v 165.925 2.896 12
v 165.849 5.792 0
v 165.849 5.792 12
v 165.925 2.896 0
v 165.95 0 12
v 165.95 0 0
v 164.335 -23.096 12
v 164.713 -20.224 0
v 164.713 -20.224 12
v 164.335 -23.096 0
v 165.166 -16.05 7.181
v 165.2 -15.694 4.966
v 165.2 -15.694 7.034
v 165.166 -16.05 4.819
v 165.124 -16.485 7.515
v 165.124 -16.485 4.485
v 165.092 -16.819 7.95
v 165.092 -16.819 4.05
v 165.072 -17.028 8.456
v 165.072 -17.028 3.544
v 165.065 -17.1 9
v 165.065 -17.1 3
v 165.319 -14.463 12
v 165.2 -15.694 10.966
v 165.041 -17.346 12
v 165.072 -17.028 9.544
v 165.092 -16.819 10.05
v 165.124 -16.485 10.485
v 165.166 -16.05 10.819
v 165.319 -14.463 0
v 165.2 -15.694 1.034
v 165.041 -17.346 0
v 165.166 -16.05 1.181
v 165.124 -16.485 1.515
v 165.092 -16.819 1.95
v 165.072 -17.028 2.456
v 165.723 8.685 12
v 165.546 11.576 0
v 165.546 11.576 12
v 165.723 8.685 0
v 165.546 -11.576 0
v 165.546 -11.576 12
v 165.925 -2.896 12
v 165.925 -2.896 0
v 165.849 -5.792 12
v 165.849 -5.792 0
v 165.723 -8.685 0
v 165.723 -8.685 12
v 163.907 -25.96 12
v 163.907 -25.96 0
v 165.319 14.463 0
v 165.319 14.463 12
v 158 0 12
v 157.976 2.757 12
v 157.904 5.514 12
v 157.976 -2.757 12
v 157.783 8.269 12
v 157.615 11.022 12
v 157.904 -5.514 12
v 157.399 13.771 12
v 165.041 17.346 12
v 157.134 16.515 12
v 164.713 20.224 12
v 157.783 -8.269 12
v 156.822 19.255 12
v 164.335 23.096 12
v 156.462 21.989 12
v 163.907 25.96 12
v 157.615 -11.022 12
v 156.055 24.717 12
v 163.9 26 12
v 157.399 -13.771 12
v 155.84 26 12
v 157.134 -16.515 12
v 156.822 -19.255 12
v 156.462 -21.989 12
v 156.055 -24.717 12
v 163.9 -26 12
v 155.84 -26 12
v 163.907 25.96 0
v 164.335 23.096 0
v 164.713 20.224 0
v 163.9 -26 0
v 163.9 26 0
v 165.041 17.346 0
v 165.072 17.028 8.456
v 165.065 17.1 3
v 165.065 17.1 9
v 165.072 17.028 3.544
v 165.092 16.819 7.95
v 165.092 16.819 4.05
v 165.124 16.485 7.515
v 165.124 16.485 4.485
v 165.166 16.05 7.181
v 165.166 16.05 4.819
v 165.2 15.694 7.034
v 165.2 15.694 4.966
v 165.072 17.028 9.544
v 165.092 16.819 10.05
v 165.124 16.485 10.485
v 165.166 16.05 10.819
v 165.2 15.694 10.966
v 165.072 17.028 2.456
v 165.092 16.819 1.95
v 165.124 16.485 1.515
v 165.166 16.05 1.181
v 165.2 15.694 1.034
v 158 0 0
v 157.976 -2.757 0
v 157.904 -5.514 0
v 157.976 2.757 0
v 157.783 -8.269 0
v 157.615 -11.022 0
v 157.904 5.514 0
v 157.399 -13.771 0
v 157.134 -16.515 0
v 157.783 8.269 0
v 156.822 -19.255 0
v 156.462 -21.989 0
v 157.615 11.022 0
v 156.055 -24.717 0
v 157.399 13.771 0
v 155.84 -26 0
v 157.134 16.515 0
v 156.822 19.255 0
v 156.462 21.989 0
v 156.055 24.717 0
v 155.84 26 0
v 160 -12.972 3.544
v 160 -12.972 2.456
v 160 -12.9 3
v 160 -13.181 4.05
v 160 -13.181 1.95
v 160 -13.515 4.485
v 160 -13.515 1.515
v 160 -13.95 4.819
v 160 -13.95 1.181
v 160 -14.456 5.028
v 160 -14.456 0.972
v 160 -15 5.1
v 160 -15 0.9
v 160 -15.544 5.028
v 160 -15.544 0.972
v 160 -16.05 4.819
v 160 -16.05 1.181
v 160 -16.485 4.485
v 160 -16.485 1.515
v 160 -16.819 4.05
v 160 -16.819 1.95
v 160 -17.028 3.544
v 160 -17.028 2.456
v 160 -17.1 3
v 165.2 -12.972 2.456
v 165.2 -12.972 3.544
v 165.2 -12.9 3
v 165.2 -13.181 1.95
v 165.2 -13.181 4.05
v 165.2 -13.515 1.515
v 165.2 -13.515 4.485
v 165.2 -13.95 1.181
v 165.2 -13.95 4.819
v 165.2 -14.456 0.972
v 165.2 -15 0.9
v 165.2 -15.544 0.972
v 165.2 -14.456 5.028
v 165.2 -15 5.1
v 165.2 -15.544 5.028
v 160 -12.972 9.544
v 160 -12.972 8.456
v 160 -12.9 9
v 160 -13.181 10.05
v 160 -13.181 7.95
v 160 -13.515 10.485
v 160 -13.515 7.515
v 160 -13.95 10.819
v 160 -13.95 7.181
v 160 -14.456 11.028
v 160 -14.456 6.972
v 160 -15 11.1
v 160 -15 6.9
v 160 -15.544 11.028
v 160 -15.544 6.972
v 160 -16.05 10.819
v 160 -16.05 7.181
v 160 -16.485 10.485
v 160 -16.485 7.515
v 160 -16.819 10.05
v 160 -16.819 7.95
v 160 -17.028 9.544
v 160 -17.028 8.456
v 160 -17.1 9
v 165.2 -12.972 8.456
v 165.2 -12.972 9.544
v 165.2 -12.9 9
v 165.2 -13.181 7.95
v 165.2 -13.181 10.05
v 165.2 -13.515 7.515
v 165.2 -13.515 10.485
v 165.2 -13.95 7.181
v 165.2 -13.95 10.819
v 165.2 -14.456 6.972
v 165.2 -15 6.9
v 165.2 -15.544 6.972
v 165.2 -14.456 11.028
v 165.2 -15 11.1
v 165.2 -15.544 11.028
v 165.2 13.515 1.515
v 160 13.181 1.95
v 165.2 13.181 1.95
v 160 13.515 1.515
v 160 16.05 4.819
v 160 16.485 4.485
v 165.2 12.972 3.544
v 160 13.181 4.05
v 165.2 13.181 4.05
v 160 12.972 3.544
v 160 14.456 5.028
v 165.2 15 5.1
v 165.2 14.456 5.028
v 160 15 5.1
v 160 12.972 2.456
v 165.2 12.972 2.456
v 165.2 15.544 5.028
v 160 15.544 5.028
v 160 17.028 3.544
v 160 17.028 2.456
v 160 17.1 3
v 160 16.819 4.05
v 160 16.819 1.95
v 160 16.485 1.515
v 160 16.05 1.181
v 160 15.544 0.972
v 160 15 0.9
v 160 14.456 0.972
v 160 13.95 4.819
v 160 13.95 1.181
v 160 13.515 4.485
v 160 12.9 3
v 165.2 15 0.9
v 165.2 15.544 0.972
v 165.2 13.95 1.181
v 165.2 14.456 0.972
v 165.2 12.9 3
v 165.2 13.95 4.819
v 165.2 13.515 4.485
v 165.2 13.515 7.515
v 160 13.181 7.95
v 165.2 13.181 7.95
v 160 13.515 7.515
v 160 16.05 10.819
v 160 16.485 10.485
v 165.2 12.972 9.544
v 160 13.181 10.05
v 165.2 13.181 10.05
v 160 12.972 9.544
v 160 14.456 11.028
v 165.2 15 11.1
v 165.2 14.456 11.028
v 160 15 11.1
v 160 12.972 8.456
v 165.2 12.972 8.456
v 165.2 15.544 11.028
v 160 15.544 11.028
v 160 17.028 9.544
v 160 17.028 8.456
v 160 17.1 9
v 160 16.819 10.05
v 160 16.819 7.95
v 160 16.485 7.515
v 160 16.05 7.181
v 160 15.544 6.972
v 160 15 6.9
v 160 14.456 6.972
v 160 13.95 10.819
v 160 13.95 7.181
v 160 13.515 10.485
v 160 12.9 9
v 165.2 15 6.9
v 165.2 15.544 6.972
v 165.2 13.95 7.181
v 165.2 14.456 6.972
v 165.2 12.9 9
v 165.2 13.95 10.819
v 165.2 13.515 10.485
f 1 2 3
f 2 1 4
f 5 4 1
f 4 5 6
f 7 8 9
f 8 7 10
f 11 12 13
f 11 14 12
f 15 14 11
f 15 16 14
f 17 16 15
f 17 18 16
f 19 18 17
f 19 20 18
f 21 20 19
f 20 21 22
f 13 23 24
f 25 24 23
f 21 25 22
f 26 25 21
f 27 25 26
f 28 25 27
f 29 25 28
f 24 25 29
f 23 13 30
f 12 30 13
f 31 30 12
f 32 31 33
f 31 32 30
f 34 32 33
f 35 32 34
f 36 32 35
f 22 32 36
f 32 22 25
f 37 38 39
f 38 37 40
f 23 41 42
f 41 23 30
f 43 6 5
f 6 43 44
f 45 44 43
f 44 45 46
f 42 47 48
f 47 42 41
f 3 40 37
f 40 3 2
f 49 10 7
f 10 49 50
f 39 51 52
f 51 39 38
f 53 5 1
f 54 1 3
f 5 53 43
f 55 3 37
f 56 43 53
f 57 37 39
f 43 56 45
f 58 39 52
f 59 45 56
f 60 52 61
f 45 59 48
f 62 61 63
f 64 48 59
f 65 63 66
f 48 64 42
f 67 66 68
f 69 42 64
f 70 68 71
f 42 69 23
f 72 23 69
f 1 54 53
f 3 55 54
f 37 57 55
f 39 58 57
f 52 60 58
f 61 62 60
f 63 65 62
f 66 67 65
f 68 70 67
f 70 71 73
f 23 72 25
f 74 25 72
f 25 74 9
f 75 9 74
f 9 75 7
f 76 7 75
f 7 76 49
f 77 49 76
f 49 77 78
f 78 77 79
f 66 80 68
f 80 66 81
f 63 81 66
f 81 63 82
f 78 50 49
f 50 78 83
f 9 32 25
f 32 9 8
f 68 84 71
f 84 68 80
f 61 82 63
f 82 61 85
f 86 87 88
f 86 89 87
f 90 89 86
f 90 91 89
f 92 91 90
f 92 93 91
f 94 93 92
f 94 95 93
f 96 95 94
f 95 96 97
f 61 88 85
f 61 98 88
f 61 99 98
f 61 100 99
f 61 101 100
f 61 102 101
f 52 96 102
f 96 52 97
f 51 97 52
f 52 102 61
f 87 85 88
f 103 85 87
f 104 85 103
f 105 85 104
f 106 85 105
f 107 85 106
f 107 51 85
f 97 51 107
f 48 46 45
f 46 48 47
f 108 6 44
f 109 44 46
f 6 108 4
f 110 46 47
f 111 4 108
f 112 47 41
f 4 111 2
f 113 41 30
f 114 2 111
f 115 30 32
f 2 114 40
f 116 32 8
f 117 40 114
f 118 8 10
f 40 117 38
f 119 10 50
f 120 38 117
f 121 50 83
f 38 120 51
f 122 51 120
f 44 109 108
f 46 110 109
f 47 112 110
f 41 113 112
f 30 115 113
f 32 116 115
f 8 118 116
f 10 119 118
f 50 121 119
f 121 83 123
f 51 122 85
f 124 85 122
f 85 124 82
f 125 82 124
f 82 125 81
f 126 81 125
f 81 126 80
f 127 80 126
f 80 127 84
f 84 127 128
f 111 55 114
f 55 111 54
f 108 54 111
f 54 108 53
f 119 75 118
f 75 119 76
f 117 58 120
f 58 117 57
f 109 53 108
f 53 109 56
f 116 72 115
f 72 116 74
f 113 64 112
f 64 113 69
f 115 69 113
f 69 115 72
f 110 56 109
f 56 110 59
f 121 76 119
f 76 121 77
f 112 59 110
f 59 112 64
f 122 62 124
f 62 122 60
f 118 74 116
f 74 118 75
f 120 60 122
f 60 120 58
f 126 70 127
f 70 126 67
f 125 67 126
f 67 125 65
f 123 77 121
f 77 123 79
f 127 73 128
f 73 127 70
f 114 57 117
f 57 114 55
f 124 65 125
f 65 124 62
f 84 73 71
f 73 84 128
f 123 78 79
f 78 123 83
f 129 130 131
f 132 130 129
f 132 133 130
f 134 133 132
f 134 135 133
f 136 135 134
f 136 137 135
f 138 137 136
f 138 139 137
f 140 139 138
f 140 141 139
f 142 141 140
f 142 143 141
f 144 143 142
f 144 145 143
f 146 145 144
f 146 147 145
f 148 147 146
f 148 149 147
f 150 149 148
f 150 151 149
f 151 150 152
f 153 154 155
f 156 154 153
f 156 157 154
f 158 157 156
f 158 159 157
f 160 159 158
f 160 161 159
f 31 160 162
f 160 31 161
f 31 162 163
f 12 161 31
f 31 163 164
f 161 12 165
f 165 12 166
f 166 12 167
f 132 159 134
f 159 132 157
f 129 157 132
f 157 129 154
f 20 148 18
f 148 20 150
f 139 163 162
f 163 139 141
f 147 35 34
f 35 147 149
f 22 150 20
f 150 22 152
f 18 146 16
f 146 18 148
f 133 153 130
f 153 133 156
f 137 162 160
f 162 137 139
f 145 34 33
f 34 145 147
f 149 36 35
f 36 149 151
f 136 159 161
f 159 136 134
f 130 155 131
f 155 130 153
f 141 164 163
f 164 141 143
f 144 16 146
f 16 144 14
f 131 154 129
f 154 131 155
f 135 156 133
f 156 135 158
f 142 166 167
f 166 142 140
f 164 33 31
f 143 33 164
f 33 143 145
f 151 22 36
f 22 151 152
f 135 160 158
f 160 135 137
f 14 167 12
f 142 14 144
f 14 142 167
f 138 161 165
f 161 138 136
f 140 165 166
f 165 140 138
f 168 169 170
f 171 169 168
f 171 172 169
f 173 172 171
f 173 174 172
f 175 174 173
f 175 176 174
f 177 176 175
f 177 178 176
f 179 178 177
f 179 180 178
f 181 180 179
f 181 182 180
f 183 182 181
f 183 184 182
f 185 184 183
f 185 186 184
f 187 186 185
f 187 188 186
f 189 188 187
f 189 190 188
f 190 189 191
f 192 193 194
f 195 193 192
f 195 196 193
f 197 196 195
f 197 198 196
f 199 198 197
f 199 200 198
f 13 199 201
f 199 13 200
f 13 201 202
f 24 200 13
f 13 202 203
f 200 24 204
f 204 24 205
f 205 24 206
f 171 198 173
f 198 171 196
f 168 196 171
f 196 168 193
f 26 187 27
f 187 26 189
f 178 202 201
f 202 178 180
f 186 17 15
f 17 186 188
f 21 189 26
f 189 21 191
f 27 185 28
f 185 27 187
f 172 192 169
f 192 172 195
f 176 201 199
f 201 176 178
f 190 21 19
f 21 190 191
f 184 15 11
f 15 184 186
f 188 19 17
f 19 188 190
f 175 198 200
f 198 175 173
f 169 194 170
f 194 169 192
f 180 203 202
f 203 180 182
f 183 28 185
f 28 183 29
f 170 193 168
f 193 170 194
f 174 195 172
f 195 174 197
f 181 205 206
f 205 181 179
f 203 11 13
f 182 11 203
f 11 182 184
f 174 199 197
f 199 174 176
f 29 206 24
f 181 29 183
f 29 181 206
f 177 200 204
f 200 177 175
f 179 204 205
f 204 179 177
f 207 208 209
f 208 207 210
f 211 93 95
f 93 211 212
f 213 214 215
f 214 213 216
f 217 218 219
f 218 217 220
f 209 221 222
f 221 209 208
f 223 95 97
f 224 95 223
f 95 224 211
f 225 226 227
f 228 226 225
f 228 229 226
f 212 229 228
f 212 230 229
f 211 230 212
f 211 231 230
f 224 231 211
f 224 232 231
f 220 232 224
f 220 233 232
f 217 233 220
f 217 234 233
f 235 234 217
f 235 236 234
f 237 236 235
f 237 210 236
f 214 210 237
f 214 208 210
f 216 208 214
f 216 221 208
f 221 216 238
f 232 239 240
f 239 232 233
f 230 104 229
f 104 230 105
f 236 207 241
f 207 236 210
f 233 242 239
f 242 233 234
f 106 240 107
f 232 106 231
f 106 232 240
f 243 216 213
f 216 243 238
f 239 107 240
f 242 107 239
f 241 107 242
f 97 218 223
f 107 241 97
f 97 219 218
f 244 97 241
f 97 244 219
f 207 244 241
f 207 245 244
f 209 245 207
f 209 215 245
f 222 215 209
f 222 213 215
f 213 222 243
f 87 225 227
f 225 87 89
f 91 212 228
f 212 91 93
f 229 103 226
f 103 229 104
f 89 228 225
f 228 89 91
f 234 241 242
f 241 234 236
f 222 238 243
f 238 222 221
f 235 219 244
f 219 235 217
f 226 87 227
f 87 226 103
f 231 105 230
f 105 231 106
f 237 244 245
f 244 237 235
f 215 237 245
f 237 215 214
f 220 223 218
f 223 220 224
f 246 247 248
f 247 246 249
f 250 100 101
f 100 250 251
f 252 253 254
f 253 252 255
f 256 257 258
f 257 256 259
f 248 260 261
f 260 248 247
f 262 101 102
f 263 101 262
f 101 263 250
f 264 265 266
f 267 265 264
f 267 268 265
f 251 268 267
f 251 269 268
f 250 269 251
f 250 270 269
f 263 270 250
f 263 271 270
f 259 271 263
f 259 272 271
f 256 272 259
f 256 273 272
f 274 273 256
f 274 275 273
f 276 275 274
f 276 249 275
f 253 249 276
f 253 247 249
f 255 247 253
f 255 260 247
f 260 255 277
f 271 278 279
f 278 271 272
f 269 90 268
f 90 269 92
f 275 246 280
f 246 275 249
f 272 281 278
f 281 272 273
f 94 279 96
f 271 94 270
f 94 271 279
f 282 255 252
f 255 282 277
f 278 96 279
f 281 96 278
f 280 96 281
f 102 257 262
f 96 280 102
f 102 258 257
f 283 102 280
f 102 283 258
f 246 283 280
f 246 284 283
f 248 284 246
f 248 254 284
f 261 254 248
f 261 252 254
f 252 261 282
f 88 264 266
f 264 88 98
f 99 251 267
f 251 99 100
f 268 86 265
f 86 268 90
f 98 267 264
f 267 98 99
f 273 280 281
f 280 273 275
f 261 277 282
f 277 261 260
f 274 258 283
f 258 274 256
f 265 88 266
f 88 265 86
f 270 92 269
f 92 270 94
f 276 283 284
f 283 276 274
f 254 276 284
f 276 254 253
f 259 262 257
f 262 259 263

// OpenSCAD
// =====================================================================
//  robot base :: bumper splice plate (print 1)
//  Arc plate r 158 .. 166, 12 tall (z 46 .. 58), tangential +-26 mm, behind the 0-deg joint
//  of the two bumper halves (above the ToF window). 4 M3 heat-set inserts (2 each side, along
//  X, y +-15, z 49 / 55, hole 5.2 deep); the bumper halves are screwed on from the outside
//  (M3x8 button head). It rides with the bumper (4 mm travel).
//  Print orientation: assembled (arc plate flat on the bed, height 12), no supports.
//  robot_bumper_splice()  robot frame.
// =====================================================================
include <../lib/params.scad>
include <../lib/robot_params.scad>

module robot_bumper_splice() {
    ri = 158; ro = rb_bumper_r[0] - 0.05;   // 0.05 off the bumper band's inner face
    difference() {
        intersection() {
            translate([0, 0, 46]) difference() {
                cylinder(h = 12, r = ro, $fn = 360);
                translate([0, 0, -1]) cylinder(h = 14, r = ri, $fn = 360);
            }
            translate([100, -26, 0]) cube([100, 52, 100]);
        }
        for (s = [-1, 1], z = [49, 55])
            translate([160.0, s * 15, z]) rotate([0, 90, 0]) cylinder(h = 5.2, d = m3_insert_d, $fn = 24);
    }
}

module robot_bumper_splice_print() { translate([0, 0, -46]) robot_bumper_splice(); }

robot_bumper_splice_print();
